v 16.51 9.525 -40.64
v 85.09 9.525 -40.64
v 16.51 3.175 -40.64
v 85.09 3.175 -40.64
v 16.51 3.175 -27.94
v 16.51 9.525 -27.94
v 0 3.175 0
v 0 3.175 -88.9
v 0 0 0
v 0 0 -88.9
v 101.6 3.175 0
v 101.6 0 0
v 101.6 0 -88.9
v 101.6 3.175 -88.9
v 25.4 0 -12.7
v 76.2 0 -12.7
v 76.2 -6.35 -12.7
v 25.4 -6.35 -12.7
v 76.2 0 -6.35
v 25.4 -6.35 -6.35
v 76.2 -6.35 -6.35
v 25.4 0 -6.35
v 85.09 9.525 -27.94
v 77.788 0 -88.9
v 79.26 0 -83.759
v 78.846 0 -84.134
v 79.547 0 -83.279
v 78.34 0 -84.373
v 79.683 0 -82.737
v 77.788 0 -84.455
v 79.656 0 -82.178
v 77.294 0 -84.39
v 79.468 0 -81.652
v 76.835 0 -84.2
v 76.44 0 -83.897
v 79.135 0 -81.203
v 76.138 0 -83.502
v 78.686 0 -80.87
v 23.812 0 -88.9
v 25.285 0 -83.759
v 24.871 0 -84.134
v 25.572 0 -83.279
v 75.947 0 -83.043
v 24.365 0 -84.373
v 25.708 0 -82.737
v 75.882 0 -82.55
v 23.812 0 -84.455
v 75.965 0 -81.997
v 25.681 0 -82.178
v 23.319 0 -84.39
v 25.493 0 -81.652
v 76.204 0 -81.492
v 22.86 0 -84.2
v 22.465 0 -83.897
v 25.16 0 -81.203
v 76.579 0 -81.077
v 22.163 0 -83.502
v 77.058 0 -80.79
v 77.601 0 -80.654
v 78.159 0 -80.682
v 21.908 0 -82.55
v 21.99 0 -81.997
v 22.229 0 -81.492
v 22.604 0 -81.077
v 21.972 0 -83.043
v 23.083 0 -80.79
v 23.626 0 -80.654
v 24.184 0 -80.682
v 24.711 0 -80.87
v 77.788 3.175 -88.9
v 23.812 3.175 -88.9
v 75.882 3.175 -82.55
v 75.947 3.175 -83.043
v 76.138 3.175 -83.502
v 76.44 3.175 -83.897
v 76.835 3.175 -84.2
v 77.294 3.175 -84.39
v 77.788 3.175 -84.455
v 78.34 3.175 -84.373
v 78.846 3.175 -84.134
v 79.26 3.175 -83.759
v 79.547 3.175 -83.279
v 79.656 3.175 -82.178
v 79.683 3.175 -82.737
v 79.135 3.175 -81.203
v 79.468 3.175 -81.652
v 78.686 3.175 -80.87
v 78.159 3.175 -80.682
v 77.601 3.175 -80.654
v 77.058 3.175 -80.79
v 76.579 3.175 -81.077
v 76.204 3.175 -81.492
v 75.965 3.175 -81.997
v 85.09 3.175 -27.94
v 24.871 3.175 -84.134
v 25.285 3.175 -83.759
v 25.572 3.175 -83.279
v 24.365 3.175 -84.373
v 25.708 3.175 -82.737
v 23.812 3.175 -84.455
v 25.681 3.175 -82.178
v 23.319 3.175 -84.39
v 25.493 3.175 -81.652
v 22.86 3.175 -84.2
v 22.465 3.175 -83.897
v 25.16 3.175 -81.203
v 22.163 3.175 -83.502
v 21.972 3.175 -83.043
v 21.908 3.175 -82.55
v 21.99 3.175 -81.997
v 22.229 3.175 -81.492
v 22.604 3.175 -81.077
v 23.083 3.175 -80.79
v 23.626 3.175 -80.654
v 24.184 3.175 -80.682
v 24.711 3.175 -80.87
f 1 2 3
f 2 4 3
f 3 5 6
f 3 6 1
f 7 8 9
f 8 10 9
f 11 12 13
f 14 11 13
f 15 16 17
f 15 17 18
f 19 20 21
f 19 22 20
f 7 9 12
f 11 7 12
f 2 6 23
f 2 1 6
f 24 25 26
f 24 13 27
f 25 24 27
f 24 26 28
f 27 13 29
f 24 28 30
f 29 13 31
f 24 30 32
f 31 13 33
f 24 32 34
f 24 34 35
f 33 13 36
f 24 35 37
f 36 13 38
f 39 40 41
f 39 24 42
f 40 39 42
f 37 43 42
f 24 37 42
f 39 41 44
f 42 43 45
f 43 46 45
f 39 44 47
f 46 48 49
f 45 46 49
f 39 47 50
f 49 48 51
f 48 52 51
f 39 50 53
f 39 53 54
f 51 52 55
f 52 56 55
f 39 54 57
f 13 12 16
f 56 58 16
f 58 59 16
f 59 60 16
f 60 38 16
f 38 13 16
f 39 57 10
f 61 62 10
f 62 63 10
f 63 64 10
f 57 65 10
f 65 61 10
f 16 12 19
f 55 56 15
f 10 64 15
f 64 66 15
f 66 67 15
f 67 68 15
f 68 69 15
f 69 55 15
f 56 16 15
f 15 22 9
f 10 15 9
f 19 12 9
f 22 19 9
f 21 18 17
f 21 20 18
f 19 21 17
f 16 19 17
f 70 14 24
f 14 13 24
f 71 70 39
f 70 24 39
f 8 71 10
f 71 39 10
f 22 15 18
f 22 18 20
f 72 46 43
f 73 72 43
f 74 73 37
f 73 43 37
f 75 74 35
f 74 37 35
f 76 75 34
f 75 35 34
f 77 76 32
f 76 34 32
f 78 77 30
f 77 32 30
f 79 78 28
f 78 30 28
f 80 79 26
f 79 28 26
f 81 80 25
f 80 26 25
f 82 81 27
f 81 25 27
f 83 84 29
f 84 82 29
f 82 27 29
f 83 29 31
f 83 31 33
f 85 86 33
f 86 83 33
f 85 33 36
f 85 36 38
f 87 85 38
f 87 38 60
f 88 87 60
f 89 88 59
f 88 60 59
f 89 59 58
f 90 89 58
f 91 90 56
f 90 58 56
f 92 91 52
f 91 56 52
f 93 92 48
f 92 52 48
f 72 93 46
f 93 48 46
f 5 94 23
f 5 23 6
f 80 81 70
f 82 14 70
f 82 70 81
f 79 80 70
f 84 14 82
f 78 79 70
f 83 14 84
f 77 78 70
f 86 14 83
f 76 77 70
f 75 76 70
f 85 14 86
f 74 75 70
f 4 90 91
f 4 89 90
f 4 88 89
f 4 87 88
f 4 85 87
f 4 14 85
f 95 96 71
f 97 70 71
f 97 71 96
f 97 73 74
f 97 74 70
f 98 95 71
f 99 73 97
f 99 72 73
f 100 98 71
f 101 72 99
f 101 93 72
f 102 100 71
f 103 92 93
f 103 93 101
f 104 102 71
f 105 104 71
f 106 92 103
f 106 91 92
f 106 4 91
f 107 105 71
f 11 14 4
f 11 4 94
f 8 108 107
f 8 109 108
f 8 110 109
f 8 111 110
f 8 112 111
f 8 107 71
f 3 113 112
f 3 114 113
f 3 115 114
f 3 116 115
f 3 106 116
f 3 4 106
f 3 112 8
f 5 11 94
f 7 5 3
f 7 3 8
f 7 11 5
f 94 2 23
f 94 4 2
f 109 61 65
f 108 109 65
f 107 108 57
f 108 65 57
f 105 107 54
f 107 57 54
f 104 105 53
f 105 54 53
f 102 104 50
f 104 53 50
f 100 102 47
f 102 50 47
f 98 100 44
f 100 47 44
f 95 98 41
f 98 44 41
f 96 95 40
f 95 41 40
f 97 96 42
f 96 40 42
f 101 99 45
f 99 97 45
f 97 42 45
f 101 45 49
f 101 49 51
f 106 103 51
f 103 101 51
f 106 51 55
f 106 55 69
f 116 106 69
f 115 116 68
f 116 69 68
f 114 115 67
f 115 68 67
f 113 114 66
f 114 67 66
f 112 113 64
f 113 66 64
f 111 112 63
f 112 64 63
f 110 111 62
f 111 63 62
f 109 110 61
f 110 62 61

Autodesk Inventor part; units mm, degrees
ref_plane "YZ Plane" through (0, 0, 0) normal (1, 0, 0) x (0, 1, 0)
ref_plane "XZ Plane" through (0, 0, 0) normal (0, 1, 0) x (-1, 0, 0)
ref_plane "XY Plane" through (0, 0, 0) normal (0, 0, 1) x (1, 0, 0)
sketch "Sketch1" plane through (0, 0, 0) normal (0, 1, 0) x (-1, 0, 0)
  line L0 (0, 0) -> (-101.6, 0)
  line L1 (-101.6, 0) -> (-101.6, -88.9)
  line L2 (-101.6, -88.9) -> (0, -88.9)
  line L3 (0, -88.9) -> (0, 0)
  line L4 (-50.8, -88.9) -> (-23.8125, -88.9)
  line L5 (-50.8, -88.9) -> (-77.7875, -88.9)
  line L6 (-77.7875, -88.9) -> (-77.7875, -82.55)
  line L7 (-23.8125, -88.9) -> (-23.8125, -82.55)
  circle A0 centre (-23.8125, -82.55) radius 1.905
  circle A1 centre (-77.7875, -82.55) radius 1.905
  dimension "d0" = 101.6
  dimension "d1" = 88.9
  dimension "d2" = 26.9875
  dimension "d3" = 26.9875
  dimension "d4" = 6.35
  dimension "d5" = 6.35
  dimension "d6" = 3.81
  dimension "d7" = 3.81
extrude "Extrusion1" add sketch "Sketch1" along normal blind 3.175
sketch "Sketch2" plane through (0, 0, 0) normal (0, -1, 0) x (1, 0, 0)
  line L0 (101.6, -88.9) -> (0, -88.9) projected
  line L1 (50.8, -88.9) -> (50.8, -12.7)
  line L2 (50.8, -12.7) -> (76.2, -12.7)
  line L3 (76.2, -12.7) -> (25.4, -12.7)
  line L4 (25.4, -12.7) -> (25.4, -6.35)
  line L5 (25.4, -6.35) -> (76.2, -6.35)
  line L6 (76.2, -6.35) -> (76.2, -12.7)
  point P0 (0, 0)
  dimension "d10" = 76.2
  dimension "d11" = 25.4
  dimension "d12" = 50.8
  dimension "d13" = 6.35
extrude "Extrusion2" add sketch "Sketch2" along normal blind 6.35
sketch "Sketch3" plane through (0, 3.175, 0) normal (0, 1, 0) x (1, 0, 0)
  line L0 (0, 0) -> (101.6, 0) projected
  line L1 (0, 0) -> (0, 34.29)
  line L2 (0, 88.9) -> (0, 0) projected
  line L3 (0, 34.29) -> (50.8, 34.29)
  line L4 (50.8, 34.29) -> (50.8, 40.64)
  line L5 (50.8, 40.64) -> (16.51, 40.64)
  line L6 (16.51, 40.64) -> (85.09, 40.64)
  line L7 (85.09, 40.64) -> (85.09, 27.94)
  line L8 (85.09, 27.94) -> (16.51, 27.94)
  line L9 (16.51, 27.94) -> (16.51, 40.64)
  dimension "d16" = 34.29
  dimension "d17" = 50.8
  dimension "d18" = 6.35
  dimension "d19" = 34.29
  dimension "d20" = 68.58
  dimension "d21" = 12.7
extrude "Extrusion3" add sketch "Sketch3" along normal blind 6.35
properties part number "mainboard"
